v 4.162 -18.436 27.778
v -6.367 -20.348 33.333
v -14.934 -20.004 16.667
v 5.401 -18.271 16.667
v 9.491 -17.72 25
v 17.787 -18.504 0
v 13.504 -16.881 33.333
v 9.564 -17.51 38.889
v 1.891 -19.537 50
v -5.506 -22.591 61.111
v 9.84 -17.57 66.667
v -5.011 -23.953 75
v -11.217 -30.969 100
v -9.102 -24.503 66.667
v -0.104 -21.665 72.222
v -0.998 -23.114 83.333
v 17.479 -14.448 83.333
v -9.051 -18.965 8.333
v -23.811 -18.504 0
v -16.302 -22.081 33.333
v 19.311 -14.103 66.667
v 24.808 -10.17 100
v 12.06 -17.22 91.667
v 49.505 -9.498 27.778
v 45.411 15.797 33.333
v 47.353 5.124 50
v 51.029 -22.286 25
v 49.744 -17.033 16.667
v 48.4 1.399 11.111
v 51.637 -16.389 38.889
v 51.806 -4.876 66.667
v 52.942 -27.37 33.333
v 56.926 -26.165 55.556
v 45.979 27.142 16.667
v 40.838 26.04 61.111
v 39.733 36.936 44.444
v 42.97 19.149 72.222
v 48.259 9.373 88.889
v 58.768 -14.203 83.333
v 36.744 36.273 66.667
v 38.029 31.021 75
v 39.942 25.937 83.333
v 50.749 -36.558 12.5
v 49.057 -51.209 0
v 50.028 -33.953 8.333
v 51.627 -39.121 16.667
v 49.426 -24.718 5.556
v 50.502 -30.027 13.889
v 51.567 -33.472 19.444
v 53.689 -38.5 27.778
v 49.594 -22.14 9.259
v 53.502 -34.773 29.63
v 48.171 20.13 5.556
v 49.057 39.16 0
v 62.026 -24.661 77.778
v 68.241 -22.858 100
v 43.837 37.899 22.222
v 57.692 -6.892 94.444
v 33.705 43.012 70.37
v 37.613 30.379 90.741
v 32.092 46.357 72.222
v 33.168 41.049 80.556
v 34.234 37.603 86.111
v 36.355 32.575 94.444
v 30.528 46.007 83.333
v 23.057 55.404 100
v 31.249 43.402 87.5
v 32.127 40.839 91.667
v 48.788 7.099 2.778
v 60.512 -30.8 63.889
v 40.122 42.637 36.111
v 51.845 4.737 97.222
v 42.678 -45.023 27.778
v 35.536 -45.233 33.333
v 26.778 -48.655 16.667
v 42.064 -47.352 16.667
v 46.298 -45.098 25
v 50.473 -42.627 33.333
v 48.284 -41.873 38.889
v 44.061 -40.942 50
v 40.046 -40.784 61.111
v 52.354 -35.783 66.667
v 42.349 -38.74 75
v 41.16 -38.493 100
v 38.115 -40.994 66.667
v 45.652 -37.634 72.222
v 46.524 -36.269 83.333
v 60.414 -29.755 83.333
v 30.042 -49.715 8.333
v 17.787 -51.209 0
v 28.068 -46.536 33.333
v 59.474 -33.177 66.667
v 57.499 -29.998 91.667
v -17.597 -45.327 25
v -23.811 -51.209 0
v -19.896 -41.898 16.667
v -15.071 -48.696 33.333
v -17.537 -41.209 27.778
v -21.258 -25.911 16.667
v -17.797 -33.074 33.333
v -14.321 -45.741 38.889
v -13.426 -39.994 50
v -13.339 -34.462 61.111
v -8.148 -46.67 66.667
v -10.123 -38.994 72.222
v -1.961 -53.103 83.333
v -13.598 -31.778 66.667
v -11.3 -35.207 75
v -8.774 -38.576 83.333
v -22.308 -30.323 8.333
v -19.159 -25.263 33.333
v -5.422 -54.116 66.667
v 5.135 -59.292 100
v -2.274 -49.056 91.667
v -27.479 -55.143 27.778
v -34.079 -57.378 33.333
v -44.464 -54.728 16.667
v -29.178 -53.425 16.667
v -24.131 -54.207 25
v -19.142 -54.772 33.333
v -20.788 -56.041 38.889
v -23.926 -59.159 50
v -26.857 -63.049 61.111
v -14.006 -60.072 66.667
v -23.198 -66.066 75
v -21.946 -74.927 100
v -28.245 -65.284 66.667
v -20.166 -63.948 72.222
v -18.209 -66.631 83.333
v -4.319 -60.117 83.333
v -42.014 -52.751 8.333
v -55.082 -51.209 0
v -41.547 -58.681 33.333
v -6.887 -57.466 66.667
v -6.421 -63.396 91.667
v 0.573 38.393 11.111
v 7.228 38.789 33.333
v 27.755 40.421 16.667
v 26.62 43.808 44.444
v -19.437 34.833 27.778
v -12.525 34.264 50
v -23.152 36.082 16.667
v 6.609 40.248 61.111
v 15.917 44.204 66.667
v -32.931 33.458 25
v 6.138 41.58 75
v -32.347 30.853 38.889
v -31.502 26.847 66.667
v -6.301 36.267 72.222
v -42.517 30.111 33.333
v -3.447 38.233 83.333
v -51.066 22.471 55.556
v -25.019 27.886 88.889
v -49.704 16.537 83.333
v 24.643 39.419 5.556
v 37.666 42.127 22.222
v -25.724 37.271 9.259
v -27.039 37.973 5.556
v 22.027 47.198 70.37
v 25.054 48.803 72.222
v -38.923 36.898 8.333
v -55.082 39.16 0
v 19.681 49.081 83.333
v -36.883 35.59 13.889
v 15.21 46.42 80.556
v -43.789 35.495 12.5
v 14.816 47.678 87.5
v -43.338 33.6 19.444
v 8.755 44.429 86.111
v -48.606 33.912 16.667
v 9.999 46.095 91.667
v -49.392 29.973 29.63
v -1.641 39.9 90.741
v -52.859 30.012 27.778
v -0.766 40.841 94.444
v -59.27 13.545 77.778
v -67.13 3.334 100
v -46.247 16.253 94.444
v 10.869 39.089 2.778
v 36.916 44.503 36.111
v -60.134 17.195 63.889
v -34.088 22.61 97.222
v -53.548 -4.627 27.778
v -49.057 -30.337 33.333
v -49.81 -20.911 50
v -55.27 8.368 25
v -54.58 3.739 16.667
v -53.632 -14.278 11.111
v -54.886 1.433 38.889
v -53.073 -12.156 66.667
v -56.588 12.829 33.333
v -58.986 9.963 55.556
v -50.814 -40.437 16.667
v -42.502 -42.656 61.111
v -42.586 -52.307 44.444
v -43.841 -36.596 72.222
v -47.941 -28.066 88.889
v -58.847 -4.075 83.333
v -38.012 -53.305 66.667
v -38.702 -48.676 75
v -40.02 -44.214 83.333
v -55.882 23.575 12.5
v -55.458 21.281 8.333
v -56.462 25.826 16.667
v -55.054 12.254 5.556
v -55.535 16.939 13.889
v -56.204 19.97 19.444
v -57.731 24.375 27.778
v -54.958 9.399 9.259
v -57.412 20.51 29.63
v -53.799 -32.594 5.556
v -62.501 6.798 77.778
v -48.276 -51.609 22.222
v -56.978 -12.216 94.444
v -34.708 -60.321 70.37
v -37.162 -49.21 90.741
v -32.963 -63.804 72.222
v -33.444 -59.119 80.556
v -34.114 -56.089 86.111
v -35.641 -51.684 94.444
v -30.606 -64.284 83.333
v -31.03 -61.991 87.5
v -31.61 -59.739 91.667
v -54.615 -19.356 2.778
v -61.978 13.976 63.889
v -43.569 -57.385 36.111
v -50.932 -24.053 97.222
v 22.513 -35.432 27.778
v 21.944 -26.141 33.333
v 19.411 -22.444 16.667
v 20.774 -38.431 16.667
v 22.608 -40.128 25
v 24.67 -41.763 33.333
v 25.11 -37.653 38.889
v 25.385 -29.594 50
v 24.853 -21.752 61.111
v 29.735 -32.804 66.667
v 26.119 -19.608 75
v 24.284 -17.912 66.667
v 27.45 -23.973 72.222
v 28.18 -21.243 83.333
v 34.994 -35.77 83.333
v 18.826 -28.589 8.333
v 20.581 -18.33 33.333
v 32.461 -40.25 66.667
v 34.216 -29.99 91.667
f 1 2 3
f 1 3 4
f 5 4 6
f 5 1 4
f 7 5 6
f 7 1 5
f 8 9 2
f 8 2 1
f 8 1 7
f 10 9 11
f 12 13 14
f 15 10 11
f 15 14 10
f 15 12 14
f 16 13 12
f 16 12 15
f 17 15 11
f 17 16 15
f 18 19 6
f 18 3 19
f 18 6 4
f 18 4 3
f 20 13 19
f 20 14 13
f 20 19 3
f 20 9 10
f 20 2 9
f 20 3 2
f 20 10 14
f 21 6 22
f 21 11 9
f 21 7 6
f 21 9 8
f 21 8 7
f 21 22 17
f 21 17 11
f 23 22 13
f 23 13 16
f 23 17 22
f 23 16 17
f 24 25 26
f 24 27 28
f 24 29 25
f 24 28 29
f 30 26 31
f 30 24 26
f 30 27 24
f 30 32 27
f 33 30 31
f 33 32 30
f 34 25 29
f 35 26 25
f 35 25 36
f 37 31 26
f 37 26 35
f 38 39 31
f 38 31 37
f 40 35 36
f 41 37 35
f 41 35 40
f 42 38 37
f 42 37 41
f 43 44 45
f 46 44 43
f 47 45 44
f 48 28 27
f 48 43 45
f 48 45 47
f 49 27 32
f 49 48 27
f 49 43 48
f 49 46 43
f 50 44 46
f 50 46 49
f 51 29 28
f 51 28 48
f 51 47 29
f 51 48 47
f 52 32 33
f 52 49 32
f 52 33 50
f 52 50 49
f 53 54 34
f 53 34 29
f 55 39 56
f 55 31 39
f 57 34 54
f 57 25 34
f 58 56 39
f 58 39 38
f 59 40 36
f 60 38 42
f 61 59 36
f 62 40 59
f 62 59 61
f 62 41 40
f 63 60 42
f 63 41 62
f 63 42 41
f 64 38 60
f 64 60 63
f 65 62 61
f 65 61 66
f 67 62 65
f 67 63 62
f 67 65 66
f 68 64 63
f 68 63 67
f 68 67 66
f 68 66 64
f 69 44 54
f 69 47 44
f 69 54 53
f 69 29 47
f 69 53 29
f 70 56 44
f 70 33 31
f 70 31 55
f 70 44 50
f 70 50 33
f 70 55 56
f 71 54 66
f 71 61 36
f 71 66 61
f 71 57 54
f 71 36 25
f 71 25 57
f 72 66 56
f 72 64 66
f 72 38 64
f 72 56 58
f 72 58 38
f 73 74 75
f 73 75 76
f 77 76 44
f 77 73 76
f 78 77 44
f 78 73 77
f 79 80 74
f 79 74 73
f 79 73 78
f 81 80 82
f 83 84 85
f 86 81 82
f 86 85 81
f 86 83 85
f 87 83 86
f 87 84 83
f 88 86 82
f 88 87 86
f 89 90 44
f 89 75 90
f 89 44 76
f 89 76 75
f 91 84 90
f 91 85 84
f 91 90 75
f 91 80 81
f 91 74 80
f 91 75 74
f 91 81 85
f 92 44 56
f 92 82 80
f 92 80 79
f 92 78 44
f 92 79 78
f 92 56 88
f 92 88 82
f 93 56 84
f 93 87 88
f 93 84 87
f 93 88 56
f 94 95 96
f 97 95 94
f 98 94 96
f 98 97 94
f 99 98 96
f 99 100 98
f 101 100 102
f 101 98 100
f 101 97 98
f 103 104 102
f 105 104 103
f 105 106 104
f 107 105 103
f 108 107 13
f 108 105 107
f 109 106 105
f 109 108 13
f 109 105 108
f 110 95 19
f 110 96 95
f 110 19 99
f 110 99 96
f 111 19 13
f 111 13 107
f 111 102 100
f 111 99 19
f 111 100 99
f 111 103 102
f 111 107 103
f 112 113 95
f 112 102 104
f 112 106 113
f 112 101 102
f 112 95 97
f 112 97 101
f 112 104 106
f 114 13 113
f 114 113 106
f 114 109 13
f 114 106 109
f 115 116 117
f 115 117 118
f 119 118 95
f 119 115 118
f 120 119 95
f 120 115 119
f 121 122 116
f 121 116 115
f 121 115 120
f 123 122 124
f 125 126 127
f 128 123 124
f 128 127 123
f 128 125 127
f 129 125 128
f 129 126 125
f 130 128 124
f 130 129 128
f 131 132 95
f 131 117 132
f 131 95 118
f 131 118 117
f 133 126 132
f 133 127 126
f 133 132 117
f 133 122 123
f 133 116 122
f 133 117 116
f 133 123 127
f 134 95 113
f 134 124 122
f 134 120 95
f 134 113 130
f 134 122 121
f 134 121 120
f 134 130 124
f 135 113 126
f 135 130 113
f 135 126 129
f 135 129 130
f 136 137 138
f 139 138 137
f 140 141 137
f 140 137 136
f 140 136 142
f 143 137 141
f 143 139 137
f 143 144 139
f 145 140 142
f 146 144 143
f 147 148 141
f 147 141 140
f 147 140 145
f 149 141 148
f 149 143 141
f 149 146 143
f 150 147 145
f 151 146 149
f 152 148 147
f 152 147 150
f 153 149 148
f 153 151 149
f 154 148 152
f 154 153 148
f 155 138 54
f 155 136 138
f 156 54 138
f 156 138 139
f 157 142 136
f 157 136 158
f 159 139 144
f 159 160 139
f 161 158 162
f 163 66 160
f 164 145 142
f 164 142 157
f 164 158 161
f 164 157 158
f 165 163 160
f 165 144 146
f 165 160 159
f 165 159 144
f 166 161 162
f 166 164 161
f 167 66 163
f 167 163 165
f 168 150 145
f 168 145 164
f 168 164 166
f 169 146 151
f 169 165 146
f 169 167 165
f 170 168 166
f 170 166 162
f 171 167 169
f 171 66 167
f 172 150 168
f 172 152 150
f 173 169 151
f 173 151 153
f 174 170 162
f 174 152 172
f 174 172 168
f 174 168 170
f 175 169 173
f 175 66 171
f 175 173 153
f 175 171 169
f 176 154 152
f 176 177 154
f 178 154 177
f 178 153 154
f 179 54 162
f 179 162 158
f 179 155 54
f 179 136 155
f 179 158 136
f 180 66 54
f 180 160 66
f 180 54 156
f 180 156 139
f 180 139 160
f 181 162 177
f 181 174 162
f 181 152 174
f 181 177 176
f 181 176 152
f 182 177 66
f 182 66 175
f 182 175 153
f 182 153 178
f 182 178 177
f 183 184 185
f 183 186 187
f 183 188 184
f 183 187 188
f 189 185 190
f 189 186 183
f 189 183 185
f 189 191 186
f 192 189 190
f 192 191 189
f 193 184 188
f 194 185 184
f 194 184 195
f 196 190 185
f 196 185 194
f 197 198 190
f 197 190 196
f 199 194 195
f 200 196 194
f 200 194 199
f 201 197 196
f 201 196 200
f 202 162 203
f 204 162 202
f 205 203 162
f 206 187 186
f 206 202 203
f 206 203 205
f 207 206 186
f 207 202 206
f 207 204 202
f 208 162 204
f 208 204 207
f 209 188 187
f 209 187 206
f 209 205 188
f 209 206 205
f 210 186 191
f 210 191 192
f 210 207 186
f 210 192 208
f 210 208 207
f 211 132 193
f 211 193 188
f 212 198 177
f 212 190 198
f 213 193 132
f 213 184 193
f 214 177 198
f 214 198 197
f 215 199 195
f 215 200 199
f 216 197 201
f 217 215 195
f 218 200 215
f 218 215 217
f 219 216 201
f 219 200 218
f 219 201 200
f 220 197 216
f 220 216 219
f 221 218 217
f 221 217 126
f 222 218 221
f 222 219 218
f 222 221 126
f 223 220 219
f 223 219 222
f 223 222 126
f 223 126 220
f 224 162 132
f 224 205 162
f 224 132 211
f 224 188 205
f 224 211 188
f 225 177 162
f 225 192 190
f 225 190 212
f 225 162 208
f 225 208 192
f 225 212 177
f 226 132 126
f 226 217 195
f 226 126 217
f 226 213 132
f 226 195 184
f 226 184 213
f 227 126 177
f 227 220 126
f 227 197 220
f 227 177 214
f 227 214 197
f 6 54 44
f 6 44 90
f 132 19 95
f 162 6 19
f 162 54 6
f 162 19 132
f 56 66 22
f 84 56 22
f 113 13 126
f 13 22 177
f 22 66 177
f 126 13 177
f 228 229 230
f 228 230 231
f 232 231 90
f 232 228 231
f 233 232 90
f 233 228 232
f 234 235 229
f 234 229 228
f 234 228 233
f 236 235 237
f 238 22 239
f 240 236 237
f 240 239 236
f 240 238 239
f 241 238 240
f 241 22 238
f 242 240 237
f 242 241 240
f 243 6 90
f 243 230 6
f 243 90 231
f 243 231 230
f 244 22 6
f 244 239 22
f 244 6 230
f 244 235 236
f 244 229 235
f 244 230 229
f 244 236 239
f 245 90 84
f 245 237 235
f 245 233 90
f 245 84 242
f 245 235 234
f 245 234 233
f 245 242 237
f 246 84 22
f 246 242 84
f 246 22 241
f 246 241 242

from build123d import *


with BuildPart() as f3:
    # F0 (on Top) → F3 section 0
    with BuildSketch(Plane.XY):
        Polygon((49.057379, 39.159838), (-55.081967, 39.159838), (-55.081967, -51.209018), (-23.811476, -51.209018), (-23.811476, -18.504098), (17.786887, -18.504098), (17.786887, -51.209018), (49.057379, -51.209018), align=None)
    # F2 (on offset) → F3 section 1
    with BuildSketch(Plane.XY.offset(100)):
        Polygon((23.056918, 55.403994), (-67.130402, 3.33432), (-21.945974, -74.927405), (5.135066, -59.292159), (-11.217394, -30.968868), (24.807845, -10.169686), (41.160305, -38.492978), (68.241346, -22.857731), align=None)
    loft()


solid = f3.part
